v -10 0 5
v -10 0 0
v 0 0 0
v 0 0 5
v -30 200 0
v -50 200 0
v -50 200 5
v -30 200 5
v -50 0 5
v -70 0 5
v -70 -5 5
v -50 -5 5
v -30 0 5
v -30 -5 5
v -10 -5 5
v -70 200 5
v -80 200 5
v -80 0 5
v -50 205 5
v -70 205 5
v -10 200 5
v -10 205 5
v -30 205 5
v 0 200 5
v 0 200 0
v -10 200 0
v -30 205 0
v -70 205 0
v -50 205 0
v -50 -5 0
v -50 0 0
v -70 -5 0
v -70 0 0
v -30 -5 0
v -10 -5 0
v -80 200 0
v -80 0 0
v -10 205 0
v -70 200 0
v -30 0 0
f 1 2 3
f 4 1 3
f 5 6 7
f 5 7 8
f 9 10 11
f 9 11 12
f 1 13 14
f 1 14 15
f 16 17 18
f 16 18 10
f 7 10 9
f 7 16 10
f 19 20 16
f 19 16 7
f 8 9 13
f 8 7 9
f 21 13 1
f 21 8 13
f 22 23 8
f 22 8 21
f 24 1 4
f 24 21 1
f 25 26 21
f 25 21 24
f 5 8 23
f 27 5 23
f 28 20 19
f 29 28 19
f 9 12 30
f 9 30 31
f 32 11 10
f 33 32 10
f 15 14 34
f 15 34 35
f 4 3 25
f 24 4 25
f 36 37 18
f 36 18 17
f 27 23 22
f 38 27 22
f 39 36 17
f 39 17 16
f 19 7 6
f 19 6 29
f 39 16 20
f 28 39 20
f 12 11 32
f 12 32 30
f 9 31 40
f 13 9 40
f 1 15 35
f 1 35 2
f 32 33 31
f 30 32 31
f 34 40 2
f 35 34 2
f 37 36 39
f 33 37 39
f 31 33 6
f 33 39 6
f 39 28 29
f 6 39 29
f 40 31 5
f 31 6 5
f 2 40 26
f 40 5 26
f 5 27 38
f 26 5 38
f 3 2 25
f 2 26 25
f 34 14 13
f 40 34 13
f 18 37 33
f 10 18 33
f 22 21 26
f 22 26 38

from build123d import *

# Parameters (mm, degrees)
SKETCH1_W           = 80
SKETCH1_H           = 200
BOSS_EXTRUDE1_DEPTH = 5
SKETCH2_W           = 20
SKETCH2_H           = 5
BOSS_EXTRUDE2_DEPTH = 5


with BuildPart() as part:
    # Sketch1 → Boss-Extrude1 (new body)
    with BuildSketch(Plane.XY):
        with Locations((-40, 100)):
            Rectangle(SKETCH1_W, SKETCH1_H)
    extrude(amount=BOSS_EXTRUDE1_DEPTH)

    # Sketch2 → Boss-Extrude2 (add)
    with BuildSketch(Plane.XY.offset(5)):
        with Locations((-20, 202.5)):
            Rectangle(SKETCH2_W, SKETCH2_H)
        with Locations((-60, 202.5)):
            Rectangle(SKETCH2_W, SKETCH2_H)
        with Locations((-60, -2.5)):
            Rectangle(SKETCH2_W, SKETCH2_H)
        with Locations((-20, -2.5)):
            Rectangle(SKETCH2_W, SKETCH2_H)
    extrude(amount=-BOSS_EXTRUDE2_DEPTH)


solid = part.part
